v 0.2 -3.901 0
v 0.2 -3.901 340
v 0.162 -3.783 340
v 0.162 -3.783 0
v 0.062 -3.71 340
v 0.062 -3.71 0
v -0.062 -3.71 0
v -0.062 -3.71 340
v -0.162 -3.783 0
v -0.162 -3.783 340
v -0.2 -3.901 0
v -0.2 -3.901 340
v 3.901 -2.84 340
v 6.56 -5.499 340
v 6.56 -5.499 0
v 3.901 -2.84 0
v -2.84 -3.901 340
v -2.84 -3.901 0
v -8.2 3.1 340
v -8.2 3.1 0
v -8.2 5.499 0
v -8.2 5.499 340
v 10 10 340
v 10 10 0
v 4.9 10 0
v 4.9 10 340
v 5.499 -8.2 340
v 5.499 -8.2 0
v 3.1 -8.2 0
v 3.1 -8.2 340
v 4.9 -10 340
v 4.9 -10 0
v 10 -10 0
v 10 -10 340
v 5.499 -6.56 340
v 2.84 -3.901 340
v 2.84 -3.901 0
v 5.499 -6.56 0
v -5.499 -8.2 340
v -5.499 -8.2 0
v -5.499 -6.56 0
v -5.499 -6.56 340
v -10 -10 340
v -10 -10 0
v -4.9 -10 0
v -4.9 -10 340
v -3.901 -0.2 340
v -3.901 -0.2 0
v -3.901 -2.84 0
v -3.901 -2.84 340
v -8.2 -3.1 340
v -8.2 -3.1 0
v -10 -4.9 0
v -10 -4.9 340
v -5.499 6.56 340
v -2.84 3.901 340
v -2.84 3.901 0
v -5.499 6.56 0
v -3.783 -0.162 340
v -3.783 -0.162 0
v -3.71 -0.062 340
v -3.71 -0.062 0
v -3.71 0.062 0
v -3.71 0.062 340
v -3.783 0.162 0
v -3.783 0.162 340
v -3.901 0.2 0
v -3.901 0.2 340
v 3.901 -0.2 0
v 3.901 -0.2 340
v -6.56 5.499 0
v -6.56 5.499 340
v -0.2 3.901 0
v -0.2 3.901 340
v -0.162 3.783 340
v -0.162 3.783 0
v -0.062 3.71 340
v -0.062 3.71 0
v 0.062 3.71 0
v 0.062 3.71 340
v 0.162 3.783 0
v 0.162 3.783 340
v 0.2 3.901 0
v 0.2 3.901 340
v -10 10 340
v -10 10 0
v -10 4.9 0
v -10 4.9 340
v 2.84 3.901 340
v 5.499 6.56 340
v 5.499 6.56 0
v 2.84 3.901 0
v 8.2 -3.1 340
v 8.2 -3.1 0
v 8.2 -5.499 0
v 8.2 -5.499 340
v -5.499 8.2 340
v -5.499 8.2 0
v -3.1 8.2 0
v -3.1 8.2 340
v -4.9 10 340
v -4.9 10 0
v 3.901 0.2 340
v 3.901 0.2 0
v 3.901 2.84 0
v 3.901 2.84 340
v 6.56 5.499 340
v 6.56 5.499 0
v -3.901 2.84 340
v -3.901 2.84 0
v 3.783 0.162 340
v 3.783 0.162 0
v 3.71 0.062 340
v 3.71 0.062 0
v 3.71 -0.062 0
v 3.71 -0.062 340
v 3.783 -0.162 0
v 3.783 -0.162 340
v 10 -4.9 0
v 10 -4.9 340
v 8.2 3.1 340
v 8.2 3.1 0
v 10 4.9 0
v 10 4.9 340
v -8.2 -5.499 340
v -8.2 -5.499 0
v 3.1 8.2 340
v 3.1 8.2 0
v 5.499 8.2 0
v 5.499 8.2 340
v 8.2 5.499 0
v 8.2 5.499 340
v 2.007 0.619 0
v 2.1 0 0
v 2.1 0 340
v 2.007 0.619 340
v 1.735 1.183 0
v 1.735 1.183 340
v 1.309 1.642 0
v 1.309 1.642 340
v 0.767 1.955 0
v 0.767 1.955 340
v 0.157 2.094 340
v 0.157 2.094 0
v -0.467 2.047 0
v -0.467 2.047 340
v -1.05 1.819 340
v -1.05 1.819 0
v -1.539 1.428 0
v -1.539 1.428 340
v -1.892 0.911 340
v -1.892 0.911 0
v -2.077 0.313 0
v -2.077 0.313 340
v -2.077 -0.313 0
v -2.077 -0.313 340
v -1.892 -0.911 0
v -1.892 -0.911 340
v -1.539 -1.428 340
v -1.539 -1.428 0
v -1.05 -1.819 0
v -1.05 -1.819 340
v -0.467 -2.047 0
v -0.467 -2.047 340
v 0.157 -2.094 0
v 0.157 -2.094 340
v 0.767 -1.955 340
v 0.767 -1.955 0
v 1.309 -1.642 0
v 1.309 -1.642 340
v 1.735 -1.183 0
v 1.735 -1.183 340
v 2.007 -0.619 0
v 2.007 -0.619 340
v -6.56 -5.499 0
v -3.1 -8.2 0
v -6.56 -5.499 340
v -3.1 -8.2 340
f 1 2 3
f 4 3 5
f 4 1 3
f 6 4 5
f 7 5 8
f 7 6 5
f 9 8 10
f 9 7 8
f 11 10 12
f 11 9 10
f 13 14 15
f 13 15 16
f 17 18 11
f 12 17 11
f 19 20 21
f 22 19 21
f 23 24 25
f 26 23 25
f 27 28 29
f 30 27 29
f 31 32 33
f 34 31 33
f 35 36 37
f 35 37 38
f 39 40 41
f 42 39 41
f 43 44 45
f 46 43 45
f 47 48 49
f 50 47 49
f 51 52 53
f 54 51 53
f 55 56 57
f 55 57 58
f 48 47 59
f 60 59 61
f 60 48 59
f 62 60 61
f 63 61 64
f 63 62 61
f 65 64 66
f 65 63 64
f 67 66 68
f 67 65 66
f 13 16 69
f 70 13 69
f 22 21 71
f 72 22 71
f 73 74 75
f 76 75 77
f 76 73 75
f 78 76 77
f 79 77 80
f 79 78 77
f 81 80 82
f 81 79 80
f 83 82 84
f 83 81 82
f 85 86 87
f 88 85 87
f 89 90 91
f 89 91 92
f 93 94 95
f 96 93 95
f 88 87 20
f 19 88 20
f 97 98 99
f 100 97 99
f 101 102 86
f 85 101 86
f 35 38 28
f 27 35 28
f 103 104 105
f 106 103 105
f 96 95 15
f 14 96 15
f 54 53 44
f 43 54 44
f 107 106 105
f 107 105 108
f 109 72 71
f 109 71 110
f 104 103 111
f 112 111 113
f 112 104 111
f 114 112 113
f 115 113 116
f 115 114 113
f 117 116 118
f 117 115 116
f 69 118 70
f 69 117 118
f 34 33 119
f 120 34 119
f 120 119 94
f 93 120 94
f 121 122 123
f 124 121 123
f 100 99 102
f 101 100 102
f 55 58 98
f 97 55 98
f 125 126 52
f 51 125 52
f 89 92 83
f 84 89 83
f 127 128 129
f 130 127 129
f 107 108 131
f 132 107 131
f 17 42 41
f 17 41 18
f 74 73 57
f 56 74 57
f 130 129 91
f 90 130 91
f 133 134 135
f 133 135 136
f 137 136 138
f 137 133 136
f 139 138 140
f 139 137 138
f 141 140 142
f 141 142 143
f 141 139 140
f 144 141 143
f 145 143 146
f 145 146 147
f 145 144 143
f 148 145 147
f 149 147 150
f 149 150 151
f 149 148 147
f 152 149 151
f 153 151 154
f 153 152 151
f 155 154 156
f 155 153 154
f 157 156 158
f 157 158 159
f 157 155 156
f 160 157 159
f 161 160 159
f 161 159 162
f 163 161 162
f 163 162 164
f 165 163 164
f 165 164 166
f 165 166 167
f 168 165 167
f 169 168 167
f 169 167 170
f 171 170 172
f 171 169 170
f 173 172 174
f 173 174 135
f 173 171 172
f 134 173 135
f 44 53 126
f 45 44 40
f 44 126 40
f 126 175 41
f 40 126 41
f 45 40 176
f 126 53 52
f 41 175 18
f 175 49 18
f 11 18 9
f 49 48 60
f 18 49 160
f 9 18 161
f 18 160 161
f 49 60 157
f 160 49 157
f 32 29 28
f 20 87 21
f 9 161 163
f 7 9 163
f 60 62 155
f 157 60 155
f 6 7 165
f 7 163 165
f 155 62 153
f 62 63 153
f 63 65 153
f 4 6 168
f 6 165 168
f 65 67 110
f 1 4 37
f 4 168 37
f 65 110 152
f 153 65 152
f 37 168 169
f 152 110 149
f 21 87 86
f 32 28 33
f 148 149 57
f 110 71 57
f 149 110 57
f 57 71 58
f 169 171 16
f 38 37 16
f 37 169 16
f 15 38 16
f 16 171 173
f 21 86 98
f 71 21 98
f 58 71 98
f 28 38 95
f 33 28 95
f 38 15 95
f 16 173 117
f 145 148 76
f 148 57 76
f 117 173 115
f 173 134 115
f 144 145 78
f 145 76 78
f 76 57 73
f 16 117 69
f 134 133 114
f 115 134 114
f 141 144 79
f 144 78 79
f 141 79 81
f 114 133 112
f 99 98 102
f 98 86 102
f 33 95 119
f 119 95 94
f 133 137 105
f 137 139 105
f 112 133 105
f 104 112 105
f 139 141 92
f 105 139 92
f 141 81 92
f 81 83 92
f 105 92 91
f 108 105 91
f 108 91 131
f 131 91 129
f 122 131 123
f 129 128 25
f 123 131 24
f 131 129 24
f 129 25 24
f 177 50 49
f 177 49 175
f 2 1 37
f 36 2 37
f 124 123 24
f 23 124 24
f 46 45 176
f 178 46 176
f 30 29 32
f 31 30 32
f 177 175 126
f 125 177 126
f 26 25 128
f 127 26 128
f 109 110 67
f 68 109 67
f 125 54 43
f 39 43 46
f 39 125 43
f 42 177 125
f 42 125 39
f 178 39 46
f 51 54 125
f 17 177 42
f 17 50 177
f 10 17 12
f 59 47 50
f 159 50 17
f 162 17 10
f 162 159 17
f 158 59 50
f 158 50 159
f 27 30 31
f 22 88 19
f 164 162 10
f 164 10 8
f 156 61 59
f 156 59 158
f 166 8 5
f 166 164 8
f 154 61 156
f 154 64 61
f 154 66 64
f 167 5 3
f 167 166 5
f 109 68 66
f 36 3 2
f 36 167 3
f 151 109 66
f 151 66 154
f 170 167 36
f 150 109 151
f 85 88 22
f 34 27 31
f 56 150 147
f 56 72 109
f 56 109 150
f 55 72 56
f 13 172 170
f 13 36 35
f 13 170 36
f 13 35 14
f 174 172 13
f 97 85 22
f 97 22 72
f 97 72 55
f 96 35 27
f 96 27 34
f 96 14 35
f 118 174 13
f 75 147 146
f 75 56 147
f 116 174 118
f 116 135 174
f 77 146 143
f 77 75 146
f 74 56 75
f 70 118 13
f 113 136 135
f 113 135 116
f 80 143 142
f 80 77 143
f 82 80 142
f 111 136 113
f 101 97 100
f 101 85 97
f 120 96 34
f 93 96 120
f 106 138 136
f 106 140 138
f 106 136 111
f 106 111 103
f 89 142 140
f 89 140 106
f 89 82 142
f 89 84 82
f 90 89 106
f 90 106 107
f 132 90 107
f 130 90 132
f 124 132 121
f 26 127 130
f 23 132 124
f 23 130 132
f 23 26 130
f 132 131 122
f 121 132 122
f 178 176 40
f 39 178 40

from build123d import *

# Parameters (mm, degrees)
SKETCH1_R           = 2.1
BOSS_EXTRUDE1_DEPTH = 340
CUT_EXTRUDE1_DEPTH  = 340


# Read off the part's stored shape, not the designer's step: Cut-Extrude1
with BuildPart() as part:
    # Sketch1 → Boss-Extrude1 (new body)
    with BuildSketch(Plane.XY):
        Polygon((-10, -4.9), (-10, -10), (-4.9, -10), (-3.1, -8.2), (-5.499339828, -8.2), (-5.499339828, -6.56), (-2.84, -3.900660172), (2.84, -3.900660172), (5.499339828, -6.56), (5.499339828, -8.2), (3.1, -8.2), (4.9, -10), (10, -10), (10, -4.9), (8.2, -3.1), (8.2, -5.499339828), (6.56, -5.499339828), (3.900660172, -2.84), (3.900660172, 2.84), (6.56, 5.499339828), (8.2, 5.499339828), (8.2, 3.1), (10, 4.9), (10, 10), (4.9, 10), (3.1, 8.2), (5.499339828, 8.2), (5.499339828, 6.56), (2.84, 3.900660172), (-2.84, 3.900660172), (-5.499339828, 6.56), (-5.499339828, 8.2), (-3.1, 8.2), (-4.9, 10), (-10, 10), (-10, 4.9), (-8.2, 3.1), (-8.2, 5.499339828), (-6.56, 5.499339828), (-3.900660172, 2.84), (-3.900660172, -2.84), (-6.56, -5.499339828), (-8.2, -5.499339828), (-8.2, -3.1), align=None)
        Circle(SKETCH1_R, mode=Mode.SUBTRACT)
    extrude(amount=BOSS_EXTRUDE1_DEPTH)

    # Cut-Extrude1 outline → Cut-Extrude1 (cut)
    with BuildSketch(Plane.XY):
        with BuildLine():
            ThreePointArc((-3.900660172, -0.2), (-3.700660172, 0), (-3.900660172, 0.2))
            Line((-3.900660172, 0.2), (-3.900660172, -0.2))
        make_face()
        with BuildLine():
            ThreePointArc((-0.2, 3.900660172), (0, 3.700660172), (0.2, 3.900660172))
            Line((0.2, 3.900660172), (-0.2, 3.900660172))
        make_face()
        with BuildLine():
            ThreePointArc((3.900660172, 0.2), (3.700660172, 0), (3.900660172, -0.2))
            Line((3.900660172, -0.2), (3.900660172, 0.2))
        make_face()
        with BuildLine():
            ThreePointArc((0.2, -3.900660172), (0, -3.700660172), (-0.2, -3.900660172))
            Line((-0.2, -3.900660172), (0.2, -3.900660172))
        make_face()
    extrude(amount=CUT_EXTRUDE1_DEPTH, mode=Mode.SUBTRACT)


solid = part.part
